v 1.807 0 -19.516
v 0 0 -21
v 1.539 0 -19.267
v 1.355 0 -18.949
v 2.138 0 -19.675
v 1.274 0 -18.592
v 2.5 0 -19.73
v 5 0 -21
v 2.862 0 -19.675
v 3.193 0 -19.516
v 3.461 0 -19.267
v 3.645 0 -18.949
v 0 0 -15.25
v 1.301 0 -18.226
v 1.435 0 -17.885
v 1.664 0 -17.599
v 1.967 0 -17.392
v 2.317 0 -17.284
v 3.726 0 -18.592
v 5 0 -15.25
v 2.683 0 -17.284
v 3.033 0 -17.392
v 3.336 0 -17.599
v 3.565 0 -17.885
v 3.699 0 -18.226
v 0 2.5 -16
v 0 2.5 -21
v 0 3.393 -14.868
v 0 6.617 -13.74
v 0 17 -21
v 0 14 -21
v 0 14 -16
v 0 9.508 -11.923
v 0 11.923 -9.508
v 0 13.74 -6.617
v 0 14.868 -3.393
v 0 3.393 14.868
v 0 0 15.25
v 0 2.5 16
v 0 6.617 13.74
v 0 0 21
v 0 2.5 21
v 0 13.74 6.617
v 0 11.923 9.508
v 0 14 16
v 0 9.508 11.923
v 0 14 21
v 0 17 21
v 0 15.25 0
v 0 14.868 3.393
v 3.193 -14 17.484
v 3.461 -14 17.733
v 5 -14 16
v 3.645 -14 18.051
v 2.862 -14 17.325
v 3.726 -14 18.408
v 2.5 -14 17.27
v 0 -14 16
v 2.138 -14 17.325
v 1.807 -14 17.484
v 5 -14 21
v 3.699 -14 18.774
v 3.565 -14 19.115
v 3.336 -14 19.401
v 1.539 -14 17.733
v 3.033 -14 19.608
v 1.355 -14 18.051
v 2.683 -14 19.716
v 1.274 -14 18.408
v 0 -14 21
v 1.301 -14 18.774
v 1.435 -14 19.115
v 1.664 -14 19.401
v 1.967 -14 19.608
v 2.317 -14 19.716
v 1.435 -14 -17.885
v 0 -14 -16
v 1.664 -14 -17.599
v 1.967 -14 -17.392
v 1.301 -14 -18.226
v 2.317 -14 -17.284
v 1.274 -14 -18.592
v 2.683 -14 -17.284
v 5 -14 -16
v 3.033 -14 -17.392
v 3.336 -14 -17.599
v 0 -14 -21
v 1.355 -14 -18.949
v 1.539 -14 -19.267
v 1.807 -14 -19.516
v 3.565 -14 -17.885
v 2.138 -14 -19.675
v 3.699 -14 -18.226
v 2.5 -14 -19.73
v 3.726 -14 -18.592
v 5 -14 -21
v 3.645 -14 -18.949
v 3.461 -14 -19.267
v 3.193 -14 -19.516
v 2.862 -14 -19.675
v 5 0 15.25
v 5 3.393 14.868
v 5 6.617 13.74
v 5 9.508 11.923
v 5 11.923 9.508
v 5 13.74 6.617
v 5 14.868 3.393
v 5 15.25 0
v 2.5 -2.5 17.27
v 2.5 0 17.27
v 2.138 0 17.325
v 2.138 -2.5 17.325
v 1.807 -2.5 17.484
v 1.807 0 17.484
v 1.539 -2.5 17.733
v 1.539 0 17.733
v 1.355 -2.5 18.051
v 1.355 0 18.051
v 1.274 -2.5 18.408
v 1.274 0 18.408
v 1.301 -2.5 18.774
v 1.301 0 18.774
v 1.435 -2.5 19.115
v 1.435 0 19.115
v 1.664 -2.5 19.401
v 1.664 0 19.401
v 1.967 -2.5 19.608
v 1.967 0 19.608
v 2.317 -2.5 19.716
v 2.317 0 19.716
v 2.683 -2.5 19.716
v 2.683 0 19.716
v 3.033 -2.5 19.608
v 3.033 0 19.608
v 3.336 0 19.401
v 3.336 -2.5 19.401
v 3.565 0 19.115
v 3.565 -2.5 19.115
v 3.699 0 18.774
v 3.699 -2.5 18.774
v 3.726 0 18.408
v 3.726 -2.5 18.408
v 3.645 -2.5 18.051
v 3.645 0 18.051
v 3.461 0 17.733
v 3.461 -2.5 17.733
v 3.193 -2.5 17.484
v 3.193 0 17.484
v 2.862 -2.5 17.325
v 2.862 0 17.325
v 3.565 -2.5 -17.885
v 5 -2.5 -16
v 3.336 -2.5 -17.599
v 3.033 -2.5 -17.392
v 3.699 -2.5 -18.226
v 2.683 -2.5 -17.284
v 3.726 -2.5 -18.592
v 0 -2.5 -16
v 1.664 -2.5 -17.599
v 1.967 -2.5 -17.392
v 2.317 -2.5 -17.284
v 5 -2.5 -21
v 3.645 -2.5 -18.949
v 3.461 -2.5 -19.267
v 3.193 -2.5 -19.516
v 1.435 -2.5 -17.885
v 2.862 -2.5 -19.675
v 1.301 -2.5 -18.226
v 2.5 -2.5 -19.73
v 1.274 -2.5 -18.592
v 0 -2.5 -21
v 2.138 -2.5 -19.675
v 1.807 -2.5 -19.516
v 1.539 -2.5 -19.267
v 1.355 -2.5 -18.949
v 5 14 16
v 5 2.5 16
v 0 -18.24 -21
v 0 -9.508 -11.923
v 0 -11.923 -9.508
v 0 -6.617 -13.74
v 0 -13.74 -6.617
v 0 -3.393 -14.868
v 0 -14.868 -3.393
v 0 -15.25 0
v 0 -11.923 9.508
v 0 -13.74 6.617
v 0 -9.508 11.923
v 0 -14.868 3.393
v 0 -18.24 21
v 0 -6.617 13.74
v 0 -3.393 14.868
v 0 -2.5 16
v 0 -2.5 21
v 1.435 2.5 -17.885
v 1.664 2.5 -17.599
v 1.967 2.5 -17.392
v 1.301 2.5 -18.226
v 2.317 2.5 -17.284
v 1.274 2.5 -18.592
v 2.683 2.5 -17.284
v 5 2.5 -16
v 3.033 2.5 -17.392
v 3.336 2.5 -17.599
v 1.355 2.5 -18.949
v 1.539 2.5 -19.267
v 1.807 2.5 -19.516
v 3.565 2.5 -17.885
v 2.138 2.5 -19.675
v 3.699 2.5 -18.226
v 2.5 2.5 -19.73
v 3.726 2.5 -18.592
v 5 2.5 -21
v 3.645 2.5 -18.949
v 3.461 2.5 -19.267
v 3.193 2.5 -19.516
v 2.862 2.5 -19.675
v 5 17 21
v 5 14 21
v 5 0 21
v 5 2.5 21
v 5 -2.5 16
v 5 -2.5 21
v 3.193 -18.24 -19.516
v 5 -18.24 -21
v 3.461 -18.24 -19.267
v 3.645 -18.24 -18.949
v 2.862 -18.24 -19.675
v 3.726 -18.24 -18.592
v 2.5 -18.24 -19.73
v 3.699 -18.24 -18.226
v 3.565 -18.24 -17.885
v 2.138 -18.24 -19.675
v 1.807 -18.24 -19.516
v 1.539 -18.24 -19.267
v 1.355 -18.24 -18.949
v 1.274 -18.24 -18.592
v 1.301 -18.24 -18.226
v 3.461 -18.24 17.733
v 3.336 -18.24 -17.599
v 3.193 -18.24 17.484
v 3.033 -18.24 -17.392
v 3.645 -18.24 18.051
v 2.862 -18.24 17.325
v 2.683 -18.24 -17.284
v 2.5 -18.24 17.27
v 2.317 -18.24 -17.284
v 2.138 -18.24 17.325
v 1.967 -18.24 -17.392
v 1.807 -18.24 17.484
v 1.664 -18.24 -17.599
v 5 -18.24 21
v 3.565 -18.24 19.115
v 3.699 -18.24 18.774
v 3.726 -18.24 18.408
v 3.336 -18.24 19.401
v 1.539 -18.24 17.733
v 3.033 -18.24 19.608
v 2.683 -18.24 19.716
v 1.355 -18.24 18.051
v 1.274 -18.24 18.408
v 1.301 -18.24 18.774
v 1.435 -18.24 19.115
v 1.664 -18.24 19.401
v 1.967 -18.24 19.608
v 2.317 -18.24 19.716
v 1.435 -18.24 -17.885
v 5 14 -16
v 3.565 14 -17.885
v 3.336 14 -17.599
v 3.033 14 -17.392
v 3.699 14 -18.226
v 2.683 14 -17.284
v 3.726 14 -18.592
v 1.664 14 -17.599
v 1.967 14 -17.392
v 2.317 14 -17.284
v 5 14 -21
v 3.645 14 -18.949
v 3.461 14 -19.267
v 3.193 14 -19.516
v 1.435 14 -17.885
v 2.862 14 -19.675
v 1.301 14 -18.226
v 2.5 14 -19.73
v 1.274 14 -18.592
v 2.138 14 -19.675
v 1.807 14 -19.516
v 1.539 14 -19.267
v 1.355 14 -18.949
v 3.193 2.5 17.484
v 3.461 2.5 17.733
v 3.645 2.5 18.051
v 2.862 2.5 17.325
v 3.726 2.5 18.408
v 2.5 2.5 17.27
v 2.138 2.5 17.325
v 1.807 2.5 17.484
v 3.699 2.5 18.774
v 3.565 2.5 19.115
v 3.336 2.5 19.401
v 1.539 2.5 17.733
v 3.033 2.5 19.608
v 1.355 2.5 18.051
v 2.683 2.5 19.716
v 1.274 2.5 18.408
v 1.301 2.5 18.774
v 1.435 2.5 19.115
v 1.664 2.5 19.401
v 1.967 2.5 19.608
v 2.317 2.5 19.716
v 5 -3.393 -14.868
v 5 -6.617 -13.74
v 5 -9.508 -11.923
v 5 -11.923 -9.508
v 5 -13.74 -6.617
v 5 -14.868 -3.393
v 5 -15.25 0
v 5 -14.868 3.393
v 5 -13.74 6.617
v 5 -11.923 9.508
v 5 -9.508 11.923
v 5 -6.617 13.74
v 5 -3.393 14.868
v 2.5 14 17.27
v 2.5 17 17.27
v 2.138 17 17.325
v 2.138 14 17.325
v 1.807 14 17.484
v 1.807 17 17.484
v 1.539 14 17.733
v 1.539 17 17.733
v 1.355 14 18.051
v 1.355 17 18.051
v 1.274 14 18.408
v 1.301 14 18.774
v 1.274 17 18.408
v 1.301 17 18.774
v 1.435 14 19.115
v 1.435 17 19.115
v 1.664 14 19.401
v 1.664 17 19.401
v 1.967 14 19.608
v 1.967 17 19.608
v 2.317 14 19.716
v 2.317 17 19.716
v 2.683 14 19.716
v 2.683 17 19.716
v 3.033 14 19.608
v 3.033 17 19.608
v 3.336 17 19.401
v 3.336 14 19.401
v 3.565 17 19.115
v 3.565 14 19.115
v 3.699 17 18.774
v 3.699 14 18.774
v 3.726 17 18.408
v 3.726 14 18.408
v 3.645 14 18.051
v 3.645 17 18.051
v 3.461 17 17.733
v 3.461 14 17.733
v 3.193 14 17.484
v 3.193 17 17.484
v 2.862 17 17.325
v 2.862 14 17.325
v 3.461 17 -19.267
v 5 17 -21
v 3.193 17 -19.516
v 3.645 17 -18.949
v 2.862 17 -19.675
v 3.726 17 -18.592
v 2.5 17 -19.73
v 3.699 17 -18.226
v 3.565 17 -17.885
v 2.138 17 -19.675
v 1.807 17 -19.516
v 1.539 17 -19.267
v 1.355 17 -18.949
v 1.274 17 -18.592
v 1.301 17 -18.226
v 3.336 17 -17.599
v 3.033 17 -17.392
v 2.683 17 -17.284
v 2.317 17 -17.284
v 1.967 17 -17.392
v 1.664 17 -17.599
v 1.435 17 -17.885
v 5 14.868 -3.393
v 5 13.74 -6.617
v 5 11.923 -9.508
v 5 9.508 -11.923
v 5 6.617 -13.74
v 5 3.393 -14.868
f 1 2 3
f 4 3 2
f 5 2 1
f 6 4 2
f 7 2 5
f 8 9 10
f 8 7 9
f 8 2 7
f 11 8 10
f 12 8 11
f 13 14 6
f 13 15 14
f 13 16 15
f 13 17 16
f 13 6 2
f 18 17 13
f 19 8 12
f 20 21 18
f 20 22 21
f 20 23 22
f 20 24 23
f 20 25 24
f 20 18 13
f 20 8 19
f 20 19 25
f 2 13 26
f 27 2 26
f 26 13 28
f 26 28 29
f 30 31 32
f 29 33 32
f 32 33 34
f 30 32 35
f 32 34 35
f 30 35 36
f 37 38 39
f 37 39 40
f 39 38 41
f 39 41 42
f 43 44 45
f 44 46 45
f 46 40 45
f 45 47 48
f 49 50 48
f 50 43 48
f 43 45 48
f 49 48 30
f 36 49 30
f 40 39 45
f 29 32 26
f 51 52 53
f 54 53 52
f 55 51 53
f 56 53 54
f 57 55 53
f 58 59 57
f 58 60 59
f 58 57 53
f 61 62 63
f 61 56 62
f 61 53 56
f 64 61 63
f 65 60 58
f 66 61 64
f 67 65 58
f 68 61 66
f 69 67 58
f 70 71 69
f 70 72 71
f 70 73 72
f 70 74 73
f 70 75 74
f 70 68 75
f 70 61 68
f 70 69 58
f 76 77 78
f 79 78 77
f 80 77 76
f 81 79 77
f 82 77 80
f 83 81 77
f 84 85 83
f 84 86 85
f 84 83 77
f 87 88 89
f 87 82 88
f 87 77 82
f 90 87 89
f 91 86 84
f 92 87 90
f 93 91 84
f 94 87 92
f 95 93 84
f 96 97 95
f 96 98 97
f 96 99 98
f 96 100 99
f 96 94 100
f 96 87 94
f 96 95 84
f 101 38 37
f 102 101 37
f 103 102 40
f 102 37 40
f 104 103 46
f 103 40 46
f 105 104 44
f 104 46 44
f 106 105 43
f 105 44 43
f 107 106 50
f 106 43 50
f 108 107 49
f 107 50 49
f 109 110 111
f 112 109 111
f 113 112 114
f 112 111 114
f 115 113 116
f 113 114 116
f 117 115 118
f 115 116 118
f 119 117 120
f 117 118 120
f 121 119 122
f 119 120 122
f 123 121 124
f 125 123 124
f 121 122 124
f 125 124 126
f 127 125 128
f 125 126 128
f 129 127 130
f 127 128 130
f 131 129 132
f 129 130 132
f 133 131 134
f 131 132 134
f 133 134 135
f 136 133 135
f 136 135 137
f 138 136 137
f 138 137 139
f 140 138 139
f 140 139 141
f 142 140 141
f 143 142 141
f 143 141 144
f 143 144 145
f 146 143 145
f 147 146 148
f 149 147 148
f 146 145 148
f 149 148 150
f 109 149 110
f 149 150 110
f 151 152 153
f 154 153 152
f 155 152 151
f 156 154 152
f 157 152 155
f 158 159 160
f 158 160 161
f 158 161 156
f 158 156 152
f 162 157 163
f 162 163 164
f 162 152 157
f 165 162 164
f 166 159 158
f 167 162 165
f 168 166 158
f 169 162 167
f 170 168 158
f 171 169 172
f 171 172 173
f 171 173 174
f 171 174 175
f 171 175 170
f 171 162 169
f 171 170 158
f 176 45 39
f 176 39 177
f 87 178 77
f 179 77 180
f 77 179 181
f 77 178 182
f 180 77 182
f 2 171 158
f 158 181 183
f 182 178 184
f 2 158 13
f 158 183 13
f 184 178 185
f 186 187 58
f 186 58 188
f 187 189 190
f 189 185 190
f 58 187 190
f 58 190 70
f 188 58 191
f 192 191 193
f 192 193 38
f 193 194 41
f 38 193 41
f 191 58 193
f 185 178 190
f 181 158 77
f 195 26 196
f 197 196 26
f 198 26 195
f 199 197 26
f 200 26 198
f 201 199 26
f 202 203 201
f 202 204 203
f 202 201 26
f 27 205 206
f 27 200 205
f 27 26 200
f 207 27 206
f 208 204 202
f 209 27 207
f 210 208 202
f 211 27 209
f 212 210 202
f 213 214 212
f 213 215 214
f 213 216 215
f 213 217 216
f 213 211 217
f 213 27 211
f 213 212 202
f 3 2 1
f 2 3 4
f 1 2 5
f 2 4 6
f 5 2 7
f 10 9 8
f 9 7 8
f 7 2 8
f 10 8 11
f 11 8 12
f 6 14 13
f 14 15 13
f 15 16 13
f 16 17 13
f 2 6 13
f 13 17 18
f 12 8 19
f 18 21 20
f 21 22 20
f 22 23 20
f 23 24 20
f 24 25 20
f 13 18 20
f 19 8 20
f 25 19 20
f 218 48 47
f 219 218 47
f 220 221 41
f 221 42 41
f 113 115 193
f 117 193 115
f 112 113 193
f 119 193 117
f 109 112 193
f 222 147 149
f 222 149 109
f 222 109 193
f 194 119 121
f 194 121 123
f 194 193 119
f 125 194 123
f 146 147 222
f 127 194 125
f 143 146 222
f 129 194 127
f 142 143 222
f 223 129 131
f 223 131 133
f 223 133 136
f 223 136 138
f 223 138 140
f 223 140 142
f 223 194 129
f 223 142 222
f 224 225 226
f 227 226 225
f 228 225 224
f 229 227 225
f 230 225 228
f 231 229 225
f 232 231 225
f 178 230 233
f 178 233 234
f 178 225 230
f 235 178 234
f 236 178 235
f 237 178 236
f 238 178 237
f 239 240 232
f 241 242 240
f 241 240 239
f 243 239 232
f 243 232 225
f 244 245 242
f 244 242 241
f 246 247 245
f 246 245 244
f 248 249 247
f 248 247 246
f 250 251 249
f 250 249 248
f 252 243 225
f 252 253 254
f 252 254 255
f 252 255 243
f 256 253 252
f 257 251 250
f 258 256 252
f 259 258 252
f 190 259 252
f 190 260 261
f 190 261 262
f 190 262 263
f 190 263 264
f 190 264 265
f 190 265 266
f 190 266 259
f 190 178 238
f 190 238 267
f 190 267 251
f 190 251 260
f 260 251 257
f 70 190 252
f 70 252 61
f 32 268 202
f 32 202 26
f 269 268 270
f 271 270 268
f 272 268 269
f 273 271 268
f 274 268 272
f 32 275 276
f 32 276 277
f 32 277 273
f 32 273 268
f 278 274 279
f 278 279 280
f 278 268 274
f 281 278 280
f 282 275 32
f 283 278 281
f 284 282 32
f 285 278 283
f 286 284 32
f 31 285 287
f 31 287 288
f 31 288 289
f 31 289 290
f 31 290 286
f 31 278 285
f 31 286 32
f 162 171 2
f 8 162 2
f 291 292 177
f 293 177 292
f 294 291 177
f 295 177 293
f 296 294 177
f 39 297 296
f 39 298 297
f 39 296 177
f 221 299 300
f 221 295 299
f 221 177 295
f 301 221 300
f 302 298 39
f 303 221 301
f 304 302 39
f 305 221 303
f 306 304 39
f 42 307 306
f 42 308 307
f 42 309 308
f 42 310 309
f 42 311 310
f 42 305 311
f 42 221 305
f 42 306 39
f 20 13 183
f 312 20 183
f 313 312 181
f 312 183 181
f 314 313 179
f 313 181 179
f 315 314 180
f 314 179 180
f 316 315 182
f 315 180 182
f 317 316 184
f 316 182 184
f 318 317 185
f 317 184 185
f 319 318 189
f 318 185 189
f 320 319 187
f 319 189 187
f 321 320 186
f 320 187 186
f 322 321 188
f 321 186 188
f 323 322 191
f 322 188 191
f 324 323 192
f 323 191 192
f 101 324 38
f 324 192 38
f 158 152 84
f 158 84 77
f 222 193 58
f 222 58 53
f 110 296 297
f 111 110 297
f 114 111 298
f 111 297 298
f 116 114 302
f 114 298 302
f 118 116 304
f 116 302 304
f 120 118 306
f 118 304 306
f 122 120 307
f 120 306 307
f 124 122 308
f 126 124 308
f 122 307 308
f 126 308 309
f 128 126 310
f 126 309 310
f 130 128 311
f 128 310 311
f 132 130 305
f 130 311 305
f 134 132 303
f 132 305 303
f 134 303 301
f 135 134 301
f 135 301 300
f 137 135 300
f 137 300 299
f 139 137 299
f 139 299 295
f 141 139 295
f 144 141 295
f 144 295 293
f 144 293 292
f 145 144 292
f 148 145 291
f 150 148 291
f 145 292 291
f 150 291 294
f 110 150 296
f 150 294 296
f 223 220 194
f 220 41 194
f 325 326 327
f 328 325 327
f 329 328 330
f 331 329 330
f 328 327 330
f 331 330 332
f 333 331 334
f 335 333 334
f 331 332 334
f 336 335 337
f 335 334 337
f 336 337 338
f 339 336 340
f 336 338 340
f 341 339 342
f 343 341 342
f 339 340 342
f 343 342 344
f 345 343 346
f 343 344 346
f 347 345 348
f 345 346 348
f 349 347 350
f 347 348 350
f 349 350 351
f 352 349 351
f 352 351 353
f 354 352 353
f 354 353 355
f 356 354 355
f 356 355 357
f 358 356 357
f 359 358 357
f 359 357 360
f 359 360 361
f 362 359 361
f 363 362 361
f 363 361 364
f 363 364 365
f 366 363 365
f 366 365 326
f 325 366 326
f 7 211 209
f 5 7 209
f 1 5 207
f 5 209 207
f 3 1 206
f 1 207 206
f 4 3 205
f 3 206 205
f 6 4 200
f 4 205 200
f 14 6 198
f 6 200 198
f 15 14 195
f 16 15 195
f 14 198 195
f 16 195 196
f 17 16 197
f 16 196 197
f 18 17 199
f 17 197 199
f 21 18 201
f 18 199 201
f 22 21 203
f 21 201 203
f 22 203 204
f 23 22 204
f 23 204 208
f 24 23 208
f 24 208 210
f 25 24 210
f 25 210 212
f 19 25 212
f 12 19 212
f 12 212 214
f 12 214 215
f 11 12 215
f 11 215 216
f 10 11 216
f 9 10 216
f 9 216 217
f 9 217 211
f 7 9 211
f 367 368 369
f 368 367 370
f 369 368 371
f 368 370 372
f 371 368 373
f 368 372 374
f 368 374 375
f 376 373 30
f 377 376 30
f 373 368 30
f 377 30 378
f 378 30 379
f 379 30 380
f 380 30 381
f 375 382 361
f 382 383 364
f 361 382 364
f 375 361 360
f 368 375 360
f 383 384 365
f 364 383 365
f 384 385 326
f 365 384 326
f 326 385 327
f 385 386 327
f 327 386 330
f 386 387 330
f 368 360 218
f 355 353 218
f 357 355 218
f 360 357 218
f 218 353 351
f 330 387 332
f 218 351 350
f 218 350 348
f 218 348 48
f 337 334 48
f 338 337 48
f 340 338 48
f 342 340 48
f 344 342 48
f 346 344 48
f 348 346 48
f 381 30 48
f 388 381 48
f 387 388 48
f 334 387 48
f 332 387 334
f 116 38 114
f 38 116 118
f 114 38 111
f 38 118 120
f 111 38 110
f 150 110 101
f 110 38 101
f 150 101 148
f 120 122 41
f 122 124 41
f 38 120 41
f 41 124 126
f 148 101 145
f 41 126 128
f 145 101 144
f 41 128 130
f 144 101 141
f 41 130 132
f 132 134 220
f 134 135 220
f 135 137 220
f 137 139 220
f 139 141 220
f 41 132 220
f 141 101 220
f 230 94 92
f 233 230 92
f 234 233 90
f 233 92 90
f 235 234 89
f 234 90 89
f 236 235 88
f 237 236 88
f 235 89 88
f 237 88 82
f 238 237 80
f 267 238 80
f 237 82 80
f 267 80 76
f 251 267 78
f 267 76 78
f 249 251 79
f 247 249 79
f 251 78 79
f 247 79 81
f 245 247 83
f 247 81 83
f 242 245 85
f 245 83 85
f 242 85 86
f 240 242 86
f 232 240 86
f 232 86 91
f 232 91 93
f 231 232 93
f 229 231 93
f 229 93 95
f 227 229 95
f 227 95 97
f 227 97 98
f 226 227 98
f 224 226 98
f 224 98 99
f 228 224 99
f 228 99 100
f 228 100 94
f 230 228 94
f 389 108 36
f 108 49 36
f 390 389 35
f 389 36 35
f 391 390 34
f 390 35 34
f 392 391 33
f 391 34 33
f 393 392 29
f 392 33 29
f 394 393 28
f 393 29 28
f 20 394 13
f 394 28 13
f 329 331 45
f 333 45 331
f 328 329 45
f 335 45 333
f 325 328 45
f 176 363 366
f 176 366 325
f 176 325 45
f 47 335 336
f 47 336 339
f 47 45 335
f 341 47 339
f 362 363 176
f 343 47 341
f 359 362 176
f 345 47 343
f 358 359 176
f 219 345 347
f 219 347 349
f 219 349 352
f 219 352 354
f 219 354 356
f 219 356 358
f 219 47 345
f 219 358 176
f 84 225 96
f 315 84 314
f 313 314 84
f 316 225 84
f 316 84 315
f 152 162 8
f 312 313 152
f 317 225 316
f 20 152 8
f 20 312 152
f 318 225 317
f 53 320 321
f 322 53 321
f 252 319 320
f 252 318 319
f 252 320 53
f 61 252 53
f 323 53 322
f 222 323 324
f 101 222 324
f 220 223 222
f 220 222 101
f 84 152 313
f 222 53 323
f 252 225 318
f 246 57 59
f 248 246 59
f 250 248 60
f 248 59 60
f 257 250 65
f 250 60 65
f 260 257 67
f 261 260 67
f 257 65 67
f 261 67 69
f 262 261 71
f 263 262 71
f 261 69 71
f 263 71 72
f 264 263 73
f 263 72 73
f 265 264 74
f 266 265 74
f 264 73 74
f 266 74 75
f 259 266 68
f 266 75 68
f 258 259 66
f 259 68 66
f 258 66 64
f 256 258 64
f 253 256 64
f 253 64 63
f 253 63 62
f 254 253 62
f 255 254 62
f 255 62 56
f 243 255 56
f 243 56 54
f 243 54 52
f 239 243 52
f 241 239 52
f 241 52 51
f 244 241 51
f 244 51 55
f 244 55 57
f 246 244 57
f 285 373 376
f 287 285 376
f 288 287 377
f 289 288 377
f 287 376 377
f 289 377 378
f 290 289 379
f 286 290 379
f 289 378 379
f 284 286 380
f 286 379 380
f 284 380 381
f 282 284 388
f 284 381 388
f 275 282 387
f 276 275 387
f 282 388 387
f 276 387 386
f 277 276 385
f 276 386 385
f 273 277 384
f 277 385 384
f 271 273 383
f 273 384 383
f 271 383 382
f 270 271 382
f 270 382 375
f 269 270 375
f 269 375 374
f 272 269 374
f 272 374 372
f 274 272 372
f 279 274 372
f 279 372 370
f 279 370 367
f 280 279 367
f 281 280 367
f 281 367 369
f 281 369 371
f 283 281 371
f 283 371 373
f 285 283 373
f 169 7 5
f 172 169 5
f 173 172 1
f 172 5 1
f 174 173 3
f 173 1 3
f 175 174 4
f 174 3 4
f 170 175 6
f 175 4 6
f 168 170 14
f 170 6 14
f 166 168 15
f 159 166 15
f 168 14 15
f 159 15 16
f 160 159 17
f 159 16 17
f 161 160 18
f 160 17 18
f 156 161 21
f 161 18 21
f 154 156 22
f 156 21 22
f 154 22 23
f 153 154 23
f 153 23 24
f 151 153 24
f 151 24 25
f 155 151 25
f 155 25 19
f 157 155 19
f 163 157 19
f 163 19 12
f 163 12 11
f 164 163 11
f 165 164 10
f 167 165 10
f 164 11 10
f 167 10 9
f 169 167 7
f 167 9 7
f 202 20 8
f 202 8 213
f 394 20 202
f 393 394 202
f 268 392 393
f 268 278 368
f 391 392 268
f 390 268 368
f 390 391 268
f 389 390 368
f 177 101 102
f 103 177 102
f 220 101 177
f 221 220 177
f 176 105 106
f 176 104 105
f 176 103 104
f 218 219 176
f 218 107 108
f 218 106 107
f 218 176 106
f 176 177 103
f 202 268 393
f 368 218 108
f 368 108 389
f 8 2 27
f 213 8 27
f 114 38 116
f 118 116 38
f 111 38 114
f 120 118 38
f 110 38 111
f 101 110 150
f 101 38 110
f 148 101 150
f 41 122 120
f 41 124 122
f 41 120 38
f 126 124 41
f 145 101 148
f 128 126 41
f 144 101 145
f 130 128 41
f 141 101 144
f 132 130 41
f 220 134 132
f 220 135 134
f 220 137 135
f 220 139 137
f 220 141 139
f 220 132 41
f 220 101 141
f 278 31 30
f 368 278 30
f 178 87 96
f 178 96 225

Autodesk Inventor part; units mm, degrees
ref_plane "YZ Plane" through (0, 0, 0) normal (1, 0, 0) x (0, 1, 0)
ref_plane "XZ Plane" through (0, 0, 0) normal (0, 1, 0) x (-1, 0, 0)
ref_plane "XY Plane" through (0, 0, 0) normal (0, 0, 1) x (1, 0, 0)
sketch "Sketch1" plane through (0, 0, 0) normal (1, 0, 0) x (0, 1, 0)
  circle A0 centre (0, 0) radius 15.25
  line L0 (15.25, 15.25) -> (-15.25, 15.25)
  line L1 (-15.25, 15.25) -> (-15.25, -15.25) construction
  line L2 (-15.25, -15.25) -> (15.25, -15.25)
  line L3 (15.25, -15.25) -> (15.25, 15.25) construction
  line L4 (15.25, 15.25) -> (-15.25, -15.25) construction
  line L5 (-15.25, 15.25) -> (15.25, -15.25) construction
  line L6 (17, 21) -> (-17, 21)
  line L7 (-17, 21) -> (-17, -21)
  line L8 (-17, -21) -> (17, -21)
  line L9 (17, -21) -> (17, 21)
  line L10 (17, 21) -> (-17, -21) construction
  line L11 (-17, 21) -> (17, -21) construction
  circle A1 centre (13.25, -13.25) radius 1
  circle A2 centre (13.25, 12.75) radius 1
  circle A3 centre (-12.75, -13.25) radius 1
  circle A4 centre (-12.75, 12.75) radius 1
  line L12 (17, -15.25) -> (15.25, -15.25)
  line L13 (-15.25, -15.25) -> (-17, -15.25)
  line L14 (17, 15.25) -> (15.25, 15.25)
  line L15 (-15.25, 15.25) -> (-17, 15.25)
  line L16 (-17, -21) -> (-18.24, -21)
  line L17 (-18.24, -21) -> (-18.24, 21)
  line L18 (-18.24, 21) -> (-17, 21)
  line L19 (-17, 21) -> (-17, -21)
  point P0 (0, -15.25)
  point P1 (0, 15.25)
  point P2 (0, 21)
  dimension "d0" = 30.5
  dimension "d1" = 42
  dimension "d2" = 34
  dimension "d10" = 2
  dimension "d11" = 2
  dimension "d14" = 26
  dimension "d17" = 26
  dimension "d60" = 18.24
sketch "Sketch2" plane through (0, 0, 0) normal (0, 1, 0) x (-1, 0, 0)
  line L0 (190, 50) -> (-10, 50)
  line L1 (-10, 50) -> (-10, -50)
  line L2 (-10, -50) -> (190, -50)
  line L3 (190, -50) -> (190, 50)
  point P0 (0, 0)
  point P1 (-10, 0)
  dimension "d3" = 200
  dimension "d4" = 100
  dimension "d5" = 10
extrude "Extrusion1" add sketch "Sketch1" along normal blind 5 contours A0 | A0 L0 L14 L9 L12 L2 | L0 L15 L7 L6 L9 L14 | A0 L2 L13 L7 L15 L0 | L2 L12 L9 L8 L7 L13 | A1 | A2 | A3 | A4
extrude "Extrusion4" [suppressed]
extrude "Extrusion3" cut sketch "Sketch1" along normal blind 5 contours A0
sketch "Sketch3" plane through (0, -17, 21) normal (0, 0, 1) x (1, 0, 0)
  line L0 (0, 0) -> (5, 0) projected
  line L1 (-1.7766, 34.0102) -> (-1.7765, 34.01)
  line L2 (0, 14.5) -> (5, 14.5)
  line L3 (5, 14.5) -> (5, 3)
  line L4 (5, 3) -> (0, 3)
  line L5 (0, 3) -> (0, 14.5)
  line L6 (0, 31) -> (5, 31)
  line L7 (5, 31) -> (5, 19.5)
  line L8 (5, 19.5) -> (0, 19.5)
  line L9 (0, 19.5) -> (0, 31)
  line L10 (0, 34) -> (5, 34) projected
  line L11 (0, 34) -> (0, 0) projected
  line L12 (5, 34) -> (5, 0) projected
  point P0 (0.0059, 34)
  dimension "d26" = 3
  dimension "d27" = 5
  dimension "d43" = 3
extrude "Extrusion5" cut sketch "Sketch3" against normal blind 5 contours L5 L2 L3 L4 | L9 L6 L7 L8
mirror "Mirror1" about plane through (0, 0, 0) normal (0, 0, 1) of "Extrusion5"
extrude "Extrusion7" add sketch "Sketch1" along normal blind 5 contours L7 L16 L17 L18
sketch "Sketch5" plane through (0, -18.24, -21) normal (0, -1, 0) x (1, 0, 0)
  line L0 (5, 42) -> (5, 0) projected
  line L1 (0, 0) -> (5, 0) projected
  line L2 (0, 42) -> (5, 42) projected
  point P0 (0, 21)
  point P1 (2.5, 2.5)
  point P2 (2.5, 39.5)
  dimension "d56" = 2.5
  dimension "d57" = 2.5
  dimension "d58" = 2.5
  dimension "d59" = 2.5
hole "Hole2" at (2.5, -18.24, -18.5) at (2.5, -18.24, 18.5) direction (0, 1, 0) diameter 2.459 end through all thread size "M3x0.5" class "6H" standard "ISO Metric profile"
split body "Split1" result two bodies by plane through (0, 0, 0) normal (0, 1, 0) first body at (0.5, 16.4167, 0)
properties part number "Laser holder"
